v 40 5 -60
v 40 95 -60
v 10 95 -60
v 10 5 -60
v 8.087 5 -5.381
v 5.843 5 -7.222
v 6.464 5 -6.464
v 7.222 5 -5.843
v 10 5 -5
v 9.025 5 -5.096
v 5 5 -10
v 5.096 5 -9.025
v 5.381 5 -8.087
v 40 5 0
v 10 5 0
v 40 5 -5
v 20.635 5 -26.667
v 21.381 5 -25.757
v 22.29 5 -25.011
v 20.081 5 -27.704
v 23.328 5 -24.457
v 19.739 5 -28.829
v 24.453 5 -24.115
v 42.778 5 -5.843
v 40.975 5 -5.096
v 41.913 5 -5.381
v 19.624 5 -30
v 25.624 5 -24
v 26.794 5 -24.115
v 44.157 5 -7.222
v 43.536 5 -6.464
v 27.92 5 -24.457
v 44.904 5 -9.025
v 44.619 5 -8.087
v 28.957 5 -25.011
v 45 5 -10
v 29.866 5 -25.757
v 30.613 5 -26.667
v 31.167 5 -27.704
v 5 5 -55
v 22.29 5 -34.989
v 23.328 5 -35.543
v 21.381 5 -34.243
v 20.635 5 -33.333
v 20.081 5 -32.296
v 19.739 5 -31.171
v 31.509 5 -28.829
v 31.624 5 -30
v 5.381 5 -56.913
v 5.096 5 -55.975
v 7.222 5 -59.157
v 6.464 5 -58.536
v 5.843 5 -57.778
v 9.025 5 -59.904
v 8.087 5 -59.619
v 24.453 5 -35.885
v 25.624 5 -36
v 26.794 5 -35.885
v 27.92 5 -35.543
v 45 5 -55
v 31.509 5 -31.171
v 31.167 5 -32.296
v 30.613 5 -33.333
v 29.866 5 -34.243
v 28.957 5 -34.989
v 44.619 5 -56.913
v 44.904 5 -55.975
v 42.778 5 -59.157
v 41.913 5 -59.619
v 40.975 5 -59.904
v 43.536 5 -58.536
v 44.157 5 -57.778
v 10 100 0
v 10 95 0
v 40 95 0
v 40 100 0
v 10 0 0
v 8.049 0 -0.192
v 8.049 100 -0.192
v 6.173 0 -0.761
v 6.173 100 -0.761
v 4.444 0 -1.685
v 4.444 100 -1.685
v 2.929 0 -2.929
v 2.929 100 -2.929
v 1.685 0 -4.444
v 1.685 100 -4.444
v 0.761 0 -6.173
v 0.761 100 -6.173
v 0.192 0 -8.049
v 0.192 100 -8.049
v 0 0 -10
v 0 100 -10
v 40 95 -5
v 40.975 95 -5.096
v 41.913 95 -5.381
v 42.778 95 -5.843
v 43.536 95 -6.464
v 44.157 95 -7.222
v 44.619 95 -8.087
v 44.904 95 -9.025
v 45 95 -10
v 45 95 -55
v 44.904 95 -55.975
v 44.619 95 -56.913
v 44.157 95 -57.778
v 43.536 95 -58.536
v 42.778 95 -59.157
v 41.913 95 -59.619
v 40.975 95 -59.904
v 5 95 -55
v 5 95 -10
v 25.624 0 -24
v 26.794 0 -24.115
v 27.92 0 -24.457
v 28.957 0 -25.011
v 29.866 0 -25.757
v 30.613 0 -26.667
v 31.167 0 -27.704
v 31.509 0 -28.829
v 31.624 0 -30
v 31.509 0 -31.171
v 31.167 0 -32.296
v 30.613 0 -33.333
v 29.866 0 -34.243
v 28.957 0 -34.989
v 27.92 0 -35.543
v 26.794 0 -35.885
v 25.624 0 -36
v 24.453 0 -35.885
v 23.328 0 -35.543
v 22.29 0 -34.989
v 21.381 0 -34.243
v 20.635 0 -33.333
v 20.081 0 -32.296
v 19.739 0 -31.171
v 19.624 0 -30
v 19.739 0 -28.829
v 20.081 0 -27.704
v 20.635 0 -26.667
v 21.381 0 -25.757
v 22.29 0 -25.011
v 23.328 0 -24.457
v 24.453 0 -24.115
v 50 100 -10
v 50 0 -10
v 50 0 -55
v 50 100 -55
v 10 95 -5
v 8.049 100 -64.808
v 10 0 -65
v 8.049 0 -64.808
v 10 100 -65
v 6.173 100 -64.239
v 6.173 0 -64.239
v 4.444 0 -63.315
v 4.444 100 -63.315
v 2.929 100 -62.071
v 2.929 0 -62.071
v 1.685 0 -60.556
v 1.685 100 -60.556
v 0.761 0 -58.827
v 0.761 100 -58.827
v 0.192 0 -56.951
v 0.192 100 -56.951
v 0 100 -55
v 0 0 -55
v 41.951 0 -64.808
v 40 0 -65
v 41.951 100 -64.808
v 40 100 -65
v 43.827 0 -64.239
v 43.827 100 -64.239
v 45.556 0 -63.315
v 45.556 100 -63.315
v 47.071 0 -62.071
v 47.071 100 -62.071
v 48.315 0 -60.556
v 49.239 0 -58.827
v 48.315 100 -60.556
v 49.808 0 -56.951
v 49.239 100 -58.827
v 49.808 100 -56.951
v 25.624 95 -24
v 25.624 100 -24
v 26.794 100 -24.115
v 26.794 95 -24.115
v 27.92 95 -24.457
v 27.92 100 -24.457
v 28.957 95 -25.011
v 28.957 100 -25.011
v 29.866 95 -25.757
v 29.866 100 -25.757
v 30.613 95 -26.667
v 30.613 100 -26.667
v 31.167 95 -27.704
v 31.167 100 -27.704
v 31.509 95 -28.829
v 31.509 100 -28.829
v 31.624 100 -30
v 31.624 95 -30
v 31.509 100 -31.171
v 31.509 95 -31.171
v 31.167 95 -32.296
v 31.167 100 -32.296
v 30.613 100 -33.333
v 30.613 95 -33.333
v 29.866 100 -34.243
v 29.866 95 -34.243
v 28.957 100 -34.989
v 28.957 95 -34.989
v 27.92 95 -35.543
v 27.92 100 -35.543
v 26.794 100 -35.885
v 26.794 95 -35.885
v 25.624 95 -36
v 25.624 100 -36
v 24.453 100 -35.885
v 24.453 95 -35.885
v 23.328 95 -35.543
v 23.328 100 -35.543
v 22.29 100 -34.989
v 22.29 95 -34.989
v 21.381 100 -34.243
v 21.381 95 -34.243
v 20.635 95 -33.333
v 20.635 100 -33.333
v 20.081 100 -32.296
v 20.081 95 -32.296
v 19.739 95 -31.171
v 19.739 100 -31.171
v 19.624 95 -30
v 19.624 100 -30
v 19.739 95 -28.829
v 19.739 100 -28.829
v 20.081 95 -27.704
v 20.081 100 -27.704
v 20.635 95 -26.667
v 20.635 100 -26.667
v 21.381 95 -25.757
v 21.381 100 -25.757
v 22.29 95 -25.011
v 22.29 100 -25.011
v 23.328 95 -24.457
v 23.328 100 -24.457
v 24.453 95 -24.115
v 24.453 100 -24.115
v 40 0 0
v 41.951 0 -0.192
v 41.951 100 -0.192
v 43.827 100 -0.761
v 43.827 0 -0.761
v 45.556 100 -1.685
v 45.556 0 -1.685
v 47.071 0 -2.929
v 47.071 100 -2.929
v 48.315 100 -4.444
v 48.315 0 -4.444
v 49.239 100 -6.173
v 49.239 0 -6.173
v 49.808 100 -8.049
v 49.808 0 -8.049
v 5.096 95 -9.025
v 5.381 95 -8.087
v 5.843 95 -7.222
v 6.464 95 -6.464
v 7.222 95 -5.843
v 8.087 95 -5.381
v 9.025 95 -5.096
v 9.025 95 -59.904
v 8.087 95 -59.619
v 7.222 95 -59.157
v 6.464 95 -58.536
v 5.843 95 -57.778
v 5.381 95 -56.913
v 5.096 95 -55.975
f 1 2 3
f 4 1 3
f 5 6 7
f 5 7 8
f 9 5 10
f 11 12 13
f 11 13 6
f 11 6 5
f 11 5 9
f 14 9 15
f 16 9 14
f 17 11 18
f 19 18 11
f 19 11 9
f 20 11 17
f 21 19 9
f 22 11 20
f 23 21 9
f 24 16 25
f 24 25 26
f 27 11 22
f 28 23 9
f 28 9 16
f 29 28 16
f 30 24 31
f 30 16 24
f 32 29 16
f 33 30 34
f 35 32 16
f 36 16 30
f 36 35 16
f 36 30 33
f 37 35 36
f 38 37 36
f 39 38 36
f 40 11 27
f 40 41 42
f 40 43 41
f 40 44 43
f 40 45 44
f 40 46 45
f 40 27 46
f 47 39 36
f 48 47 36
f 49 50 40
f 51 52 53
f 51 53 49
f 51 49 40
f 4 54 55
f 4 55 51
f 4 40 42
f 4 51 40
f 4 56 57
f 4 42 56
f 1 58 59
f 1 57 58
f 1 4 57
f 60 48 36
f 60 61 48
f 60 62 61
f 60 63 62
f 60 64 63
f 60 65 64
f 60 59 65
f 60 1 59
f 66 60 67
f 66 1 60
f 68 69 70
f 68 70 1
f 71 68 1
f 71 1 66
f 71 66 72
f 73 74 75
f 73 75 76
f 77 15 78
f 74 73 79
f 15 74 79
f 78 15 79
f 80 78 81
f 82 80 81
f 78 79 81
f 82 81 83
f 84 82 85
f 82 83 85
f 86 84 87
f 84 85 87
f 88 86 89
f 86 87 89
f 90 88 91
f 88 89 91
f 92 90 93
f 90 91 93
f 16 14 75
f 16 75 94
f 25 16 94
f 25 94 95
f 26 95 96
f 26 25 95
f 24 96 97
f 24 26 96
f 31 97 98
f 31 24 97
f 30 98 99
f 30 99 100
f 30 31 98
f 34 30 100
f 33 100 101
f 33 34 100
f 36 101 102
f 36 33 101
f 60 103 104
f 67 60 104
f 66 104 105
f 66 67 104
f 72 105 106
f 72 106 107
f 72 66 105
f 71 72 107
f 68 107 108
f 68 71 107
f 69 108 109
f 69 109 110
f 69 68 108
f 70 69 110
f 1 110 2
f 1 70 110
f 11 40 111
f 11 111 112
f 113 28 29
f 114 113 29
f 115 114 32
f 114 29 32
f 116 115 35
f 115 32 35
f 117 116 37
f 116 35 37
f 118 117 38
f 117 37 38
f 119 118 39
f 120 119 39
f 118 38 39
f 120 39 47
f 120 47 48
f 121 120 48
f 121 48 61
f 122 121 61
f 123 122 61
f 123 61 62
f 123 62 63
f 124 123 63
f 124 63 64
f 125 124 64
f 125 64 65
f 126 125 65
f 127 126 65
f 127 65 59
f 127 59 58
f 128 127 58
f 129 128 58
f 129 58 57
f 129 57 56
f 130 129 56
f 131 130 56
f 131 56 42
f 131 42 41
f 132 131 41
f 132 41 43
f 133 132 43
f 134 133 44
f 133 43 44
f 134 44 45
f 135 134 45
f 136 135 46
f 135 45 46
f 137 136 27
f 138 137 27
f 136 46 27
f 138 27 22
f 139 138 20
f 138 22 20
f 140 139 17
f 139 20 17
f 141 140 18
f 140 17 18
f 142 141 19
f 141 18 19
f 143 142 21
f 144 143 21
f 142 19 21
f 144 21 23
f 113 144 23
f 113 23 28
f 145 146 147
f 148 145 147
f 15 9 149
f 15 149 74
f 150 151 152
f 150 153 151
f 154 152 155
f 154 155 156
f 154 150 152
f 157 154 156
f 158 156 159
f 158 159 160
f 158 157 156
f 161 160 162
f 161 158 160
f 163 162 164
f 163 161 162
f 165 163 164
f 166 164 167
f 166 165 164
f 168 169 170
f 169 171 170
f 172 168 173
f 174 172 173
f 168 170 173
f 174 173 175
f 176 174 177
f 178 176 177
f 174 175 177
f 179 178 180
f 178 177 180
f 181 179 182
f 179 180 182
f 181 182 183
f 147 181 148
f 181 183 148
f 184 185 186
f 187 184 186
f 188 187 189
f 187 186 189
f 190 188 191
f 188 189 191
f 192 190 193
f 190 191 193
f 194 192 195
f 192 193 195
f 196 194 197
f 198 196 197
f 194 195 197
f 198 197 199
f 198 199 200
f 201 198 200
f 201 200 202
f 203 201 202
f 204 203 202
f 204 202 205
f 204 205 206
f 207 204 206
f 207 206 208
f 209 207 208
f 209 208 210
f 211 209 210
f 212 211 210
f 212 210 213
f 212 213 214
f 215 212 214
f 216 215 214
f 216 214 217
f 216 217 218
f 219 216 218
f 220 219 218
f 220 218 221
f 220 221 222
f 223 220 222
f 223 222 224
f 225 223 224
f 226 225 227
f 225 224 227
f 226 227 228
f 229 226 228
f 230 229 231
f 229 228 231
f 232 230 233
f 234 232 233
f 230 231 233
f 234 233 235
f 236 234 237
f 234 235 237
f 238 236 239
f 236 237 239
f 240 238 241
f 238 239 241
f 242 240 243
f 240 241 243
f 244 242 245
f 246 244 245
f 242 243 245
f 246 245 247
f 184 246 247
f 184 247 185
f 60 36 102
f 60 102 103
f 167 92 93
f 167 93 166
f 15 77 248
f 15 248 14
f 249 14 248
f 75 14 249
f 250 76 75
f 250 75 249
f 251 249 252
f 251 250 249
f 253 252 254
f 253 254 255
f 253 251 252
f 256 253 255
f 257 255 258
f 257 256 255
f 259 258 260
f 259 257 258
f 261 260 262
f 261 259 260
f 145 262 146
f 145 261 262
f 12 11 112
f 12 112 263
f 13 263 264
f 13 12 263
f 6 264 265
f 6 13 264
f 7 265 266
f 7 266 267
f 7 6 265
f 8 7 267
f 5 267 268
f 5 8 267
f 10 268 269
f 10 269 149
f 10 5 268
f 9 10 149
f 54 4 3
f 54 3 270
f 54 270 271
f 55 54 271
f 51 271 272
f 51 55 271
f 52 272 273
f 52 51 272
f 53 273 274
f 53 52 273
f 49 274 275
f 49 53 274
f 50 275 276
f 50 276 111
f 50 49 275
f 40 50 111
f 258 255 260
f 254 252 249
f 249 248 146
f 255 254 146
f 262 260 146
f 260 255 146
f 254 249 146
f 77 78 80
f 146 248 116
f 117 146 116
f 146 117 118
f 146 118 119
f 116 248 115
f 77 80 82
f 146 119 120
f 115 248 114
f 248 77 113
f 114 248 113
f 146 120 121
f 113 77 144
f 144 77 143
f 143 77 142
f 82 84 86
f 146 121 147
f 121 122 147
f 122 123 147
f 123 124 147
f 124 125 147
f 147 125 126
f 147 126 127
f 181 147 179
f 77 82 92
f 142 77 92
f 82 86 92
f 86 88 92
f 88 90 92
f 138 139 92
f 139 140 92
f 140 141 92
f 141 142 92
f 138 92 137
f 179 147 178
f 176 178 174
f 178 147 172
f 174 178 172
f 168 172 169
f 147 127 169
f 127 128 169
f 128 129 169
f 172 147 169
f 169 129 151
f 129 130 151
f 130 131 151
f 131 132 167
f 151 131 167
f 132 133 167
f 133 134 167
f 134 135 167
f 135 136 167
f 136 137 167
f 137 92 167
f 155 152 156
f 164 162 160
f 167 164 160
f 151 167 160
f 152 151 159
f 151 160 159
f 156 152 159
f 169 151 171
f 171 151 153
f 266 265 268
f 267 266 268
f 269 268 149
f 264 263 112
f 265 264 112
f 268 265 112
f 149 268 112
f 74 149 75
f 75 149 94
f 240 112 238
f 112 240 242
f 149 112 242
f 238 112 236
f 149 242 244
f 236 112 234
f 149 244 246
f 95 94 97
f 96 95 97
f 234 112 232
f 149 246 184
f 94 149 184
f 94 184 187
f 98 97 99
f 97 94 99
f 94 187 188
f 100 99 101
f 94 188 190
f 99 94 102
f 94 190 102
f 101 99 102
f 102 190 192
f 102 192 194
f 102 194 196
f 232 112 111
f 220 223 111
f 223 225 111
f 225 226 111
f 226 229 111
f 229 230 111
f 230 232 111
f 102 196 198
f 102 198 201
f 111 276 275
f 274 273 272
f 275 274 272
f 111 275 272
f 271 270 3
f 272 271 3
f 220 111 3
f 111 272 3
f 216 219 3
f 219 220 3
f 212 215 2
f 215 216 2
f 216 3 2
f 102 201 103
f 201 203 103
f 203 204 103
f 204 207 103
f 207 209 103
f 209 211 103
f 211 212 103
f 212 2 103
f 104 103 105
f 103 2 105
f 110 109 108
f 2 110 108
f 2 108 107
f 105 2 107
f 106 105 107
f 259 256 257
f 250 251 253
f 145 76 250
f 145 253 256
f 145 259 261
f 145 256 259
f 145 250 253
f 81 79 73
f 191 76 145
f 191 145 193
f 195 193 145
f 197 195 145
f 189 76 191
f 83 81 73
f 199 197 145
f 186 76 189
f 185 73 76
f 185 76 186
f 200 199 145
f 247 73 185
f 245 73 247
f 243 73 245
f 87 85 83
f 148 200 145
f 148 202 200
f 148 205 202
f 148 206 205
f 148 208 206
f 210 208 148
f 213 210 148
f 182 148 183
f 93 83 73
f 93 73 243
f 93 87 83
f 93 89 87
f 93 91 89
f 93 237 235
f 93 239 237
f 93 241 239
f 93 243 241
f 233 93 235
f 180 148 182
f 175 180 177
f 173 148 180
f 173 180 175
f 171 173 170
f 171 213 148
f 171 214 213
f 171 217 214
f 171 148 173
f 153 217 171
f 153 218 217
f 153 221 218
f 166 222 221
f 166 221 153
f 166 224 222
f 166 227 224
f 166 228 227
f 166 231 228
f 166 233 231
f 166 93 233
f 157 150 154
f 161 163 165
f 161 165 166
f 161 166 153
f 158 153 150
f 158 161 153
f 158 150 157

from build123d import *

# Parameters (mm, degrees)
CROQUIS1_W              = 65
CROQUIS1_H              = 100
SALIENTE_EXTRUIR1_DEPTH = 50
REDONDEO1_R             = 10
VACIADO1_START          = 5
VACIADO1_DEPTH          = 90
CROQUIS3_R              = 6
CORTAR_EXTRUIR1_DEPTH   = 130.325171564


# Read off the part's stored shape, not the designer's step: Vaciado1
with BuildPart() as part:
    # Croquis1 → Saliente-Extruir1 (new body)
    with BuildSketch(Plane(origin=(0, 0, 0), x_dir=(0, 0, -1), z_dir=(1, 0, 0))):
        with Locations((32.5, 50)):
            Rectangle(CROQUIS1_W, CROQUIS1_H)
    extrude(amount=SALIENTE_EXTRUIR1_DEPTH)

    # Redondeo1
    redondeo1_edges = [part.edges().sort_by_distance(p)[0] for p in [
        (50, 50, -65),
        (50, 50, 0),
        (0, 50, -65),
        (0, 50, 0),
    ]]
    fillet(redondeo1_edges, radius=REDONDEO1_R)

    # Vaciado1 outline → Vaciado1 (cut)
    with BuildSketch(Plane(origin=(0, 0, 0), x_dir=(1, 0, 0), z_dir=(0, 1, 0)).offset(VACIADO1_START)):
        with BuildLine():
            Line((10, 0), (40, 0))
            Line((40, 0), (40, 5))
            ThreePointArc((40, 5), (43.535533906, 6.464466094), (45, 10))
            Line((45, 10), (45, 55))
            ThreePointArc((45, 55), (43.535533906, 58.535533906), (40, 60))
            Line((40, 60), (10, 60))
            ThreePointArc((10, 60), (6.464466094, 58.535533906), (5, 55))
            Line((5, 55), (5, 10))
            ThreePointArc((5, 10), (6.464466094, 6.464466094), (10, 5))
            Line((10, 5), (10, 0))
        make_face()
    extrude(amount=VACIADO1_DEPTH, mode=Mode.SUBTRACT)

    # Croquis3 → Cortar-Extruir1 (cut, through all)
    with BuildSketch(Plane(origin=(0, 100, 0), x_dir=(1, 0, 0), z_dir=(0, 1, 0))):
        with Locations(Location((25.623850115, 30, 0), (0, 0, 270))):
            Circle(CROQUIS3_R)
    extrude(amount=-CORTAR_EXTRUIR1_DEPTH, mode=Mode.SUBTRACT)


solid = part.part
